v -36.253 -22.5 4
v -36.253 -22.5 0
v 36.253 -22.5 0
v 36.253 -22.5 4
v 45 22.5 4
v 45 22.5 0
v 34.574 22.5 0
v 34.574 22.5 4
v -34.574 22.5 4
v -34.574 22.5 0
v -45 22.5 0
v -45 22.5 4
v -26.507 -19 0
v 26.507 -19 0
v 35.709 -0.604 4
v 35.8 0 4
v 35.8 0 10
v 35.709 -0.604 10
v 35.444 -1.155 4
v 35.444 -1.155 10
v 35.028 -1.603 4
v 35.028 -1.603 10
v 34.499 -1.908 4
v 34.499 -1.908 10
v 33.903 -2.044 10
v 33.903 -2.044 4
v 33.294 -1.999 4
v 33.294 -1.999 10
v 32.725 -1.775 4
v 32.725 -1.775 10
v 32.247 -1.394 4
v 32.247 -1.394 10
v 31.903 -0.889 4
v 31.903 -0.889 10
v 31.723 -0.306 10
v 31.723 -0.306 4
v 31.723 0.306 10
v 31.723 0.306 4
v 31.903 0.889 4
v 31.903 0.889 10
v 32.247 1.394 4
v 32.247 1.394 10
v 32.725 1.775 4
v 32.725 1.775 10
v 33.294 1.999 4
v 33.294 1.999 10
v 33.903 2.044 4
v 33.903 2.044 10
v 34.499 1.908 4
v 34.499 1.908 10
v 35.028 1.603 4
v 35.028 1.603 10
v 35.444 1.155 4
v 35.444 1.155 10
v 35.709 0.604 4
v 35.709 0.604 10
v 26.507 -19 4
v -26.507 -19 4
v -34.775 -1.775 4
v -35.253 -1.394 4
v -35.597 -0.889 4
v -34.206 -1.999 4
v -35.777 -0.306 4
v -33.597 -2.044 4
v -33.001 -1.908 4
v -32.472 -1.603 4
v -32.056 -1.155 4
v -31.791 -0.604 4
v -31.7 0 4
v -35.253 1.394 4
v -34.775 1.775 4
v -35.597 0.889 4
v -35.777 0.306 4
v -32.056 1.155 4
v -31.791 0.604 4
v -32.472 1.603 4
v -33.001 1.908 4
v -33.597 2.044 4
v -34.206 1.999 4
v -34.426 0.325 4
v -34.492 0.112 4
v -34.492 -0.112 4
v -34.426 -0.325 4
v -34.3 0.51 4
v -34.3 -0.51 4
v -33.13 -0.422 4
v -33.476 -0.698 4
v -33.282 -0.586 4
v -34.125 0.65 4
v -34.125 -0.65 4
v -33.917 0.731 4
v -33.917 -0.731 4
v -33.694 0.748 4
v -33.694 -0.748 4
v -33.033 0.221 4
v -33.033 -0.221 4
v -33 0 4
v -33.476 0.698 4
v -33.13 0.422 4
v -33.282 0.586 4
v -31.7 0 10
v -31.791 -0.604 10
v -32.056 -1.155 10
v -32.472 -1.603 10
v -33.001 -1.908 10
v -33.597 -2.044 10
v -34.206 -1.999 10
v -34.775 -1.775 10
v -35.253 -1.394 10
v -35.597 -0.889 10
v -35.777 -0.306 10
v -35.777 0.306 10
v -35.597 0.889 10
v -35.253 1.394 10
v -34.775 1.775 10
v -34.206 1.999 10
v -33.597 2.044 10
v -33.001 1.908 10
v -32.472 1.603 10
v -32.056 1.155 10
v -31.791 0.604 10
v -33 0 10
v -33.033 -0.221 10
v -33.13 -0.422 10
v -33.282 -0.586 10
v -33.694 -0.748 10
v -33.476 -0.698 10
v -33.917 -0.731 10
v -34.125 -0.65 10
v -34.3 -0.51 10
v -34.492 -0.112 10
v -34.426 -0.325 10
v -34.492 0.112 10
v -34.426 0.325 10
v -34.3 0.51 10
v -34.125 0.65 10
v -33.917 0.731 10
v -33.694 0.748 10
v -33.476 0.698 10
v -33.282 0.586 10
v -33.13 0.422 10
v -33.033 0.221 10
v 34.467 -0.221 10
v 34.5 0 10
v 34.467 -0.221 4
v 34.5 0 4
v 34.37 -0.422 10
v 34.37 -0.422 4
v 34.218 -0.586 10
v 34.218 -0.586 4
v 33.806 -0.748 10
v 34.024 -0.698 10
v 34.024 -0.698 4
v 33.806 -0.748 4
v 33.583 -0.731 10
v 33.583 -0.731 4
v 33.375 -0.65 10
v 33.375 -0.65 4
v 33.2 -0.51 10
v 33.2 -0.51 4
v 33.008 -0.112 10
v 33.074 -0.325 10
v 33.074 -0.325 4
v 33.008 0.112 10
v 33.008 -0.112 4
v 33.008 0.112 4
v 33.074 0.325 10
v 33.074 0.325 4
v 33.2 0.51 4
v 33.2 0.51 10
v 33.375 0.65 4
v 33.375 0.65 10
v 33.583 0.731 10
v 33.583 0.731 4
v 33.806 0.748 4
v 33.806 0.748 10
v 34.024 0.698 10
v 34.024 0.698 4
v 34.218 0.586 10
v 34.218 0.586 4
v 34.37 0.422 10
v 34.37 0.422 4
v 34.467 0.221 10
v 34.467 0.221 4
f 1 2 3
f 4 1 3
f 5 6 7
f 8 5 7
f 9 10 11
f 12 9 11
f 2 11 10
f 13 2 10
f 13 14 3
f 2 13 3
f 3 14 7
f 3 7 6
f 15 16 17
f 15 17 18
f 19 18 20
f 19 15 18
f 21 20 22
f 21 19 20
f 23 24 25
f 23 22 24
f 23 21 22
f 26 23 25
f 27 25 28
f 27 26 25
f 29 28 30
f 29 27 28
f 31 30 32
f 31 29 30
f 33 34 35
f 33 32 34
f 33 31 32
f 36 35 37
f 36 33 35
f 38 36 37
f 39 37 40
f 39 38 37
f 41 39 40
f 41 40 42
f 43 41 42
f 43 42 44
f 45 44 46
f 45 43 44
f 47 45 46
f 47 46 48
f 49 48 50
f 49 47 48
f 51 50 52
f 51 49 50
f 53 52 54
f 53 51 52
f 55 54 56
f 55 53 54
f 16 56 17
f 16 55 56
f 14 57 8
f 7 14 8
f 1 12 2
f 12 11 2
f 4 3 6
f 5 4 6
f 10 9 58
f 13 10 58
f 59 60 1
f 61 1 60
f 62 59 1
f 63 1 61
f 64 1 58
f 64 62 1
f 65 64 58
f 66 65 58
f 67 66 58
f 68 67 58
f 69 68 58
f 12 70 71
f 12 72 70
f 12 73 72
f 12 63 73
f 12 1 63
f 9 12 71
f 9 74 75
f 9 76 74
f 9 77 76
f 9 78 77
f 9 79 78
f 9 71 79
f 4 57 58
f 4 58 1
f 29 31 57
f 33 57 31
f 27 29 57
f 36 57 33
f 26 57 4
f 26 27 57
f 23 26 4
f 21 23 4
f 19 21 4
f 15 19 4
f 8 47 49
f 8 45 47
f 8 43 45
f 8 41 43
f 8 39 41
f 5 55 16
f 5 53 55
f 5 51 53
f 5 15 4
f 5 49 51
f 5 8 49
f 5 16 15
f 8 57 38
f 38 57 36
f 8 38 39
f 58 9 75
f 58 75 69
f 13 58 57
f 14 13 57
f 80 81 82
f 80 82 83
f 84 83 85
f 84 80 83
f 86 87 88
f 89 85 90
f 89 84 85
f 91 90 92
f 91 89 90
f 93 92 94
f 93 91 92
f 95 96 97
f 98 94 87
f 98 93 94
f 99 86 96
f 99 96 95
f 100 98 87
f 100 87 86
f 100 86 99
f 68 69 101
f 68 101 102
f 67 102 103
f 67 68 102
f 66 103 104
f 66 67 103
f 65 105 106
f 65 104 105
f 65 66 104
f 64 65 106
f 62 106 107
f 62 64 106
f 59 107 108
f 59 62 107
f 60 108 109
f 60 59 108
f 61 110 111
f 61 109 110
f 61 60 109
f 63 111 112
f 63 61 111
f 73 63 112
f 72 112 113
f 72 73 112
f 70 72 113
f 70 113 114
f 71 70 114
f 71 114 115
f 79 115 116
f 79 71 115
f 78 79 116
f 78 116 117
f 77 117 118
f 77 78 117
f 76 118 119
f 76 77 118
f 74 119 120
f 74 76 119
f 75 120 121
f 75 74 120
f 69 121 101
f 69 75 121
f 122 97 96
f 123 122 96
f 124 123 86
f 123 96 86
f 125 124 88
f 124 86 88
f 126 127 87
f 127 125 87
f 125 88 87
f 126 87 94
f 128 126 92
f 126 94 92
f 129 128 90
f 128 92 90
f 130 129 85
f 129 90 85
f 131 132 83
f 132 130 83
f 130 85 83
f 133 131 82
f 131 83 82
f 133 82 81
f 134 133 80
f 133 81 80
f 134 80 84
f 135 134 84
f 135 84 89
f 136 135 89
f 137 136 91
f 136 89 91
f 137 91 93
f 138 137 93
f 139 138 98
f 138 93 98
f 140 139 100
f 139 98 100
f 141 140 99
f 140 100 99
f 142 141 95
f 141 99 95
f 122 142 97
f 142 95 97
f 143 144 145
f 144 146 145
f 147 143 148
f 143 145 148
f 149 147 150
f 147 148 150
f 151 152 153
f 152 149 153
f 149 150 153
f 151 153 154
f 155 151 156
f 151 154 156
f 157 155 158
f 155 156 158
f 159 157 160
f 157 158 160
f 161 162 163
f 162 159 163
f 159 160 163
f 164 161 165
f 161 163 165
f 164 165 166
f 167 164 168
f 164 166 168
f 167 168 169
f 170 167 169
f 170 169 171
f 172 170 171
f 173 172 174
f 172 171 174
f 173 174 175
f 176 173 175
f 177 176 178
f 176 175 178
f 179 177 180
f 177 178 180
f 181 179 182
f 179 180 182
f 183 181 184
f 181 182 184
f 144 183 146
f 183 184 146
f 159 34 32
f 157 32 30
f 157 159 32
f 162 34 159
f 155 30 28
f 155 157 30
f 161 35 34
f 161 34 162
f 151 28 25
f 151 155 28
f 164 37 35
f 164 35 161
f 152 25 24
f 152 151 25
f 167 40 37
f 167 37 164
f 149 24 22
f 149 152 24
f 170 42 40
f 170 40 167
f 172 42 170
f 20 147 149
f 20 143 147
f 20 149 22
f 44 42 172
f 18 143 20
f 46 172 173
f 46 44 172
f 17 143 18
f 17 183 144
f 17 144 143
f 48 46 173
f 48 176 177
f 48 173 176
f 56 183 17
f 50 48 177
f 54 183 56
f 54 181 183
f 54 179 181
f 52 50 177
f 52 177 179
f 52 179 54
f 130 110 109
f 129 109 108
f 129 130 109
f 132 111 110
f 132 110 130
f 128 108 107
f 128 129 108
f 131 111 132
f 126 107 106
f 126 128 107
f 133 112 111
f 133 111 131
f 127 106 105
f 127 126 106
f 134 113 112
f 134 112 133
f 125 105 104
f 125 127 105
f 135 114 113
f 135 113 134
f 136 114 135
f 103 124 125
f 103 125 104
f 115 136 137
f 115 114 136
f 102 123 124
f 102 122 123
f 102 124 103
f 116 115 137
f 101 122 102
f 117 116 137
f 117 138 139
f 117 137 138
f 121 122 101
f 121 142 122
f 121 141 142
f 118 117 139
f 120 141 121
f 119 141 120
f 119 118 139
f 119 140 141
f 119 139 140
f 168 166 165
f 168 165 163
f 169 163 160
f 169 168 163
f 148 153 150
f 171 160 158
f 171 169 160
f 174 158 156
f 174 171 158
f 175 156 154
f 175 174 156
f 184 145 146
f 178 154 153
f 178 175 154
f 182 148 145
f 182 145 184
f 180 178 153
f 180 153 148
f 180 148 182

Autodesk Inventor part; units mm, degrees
ref_plane "YZ Plane" through (0, 0, 0) normal (1, 0, 0) x (0, 1, 0)
ref_plane "XZ Plane" through (0, 0, 0) normal (0, 1, 0) x (-1, 0, 0)
ref_plane "XY Plane" through (0, 0, 0) normal (0, 0, 1) x (1, 0, 0)
sketch "Sketch1" plane through (0, 0, 0) normal (0, 0, 1) x (1, 0, 0)
  line L0 (-36.2529, -22.5) -> (36.2529, -22.5)
  line L1 (36.2529, -22.5) -> (45, 22.5)
  line L2 (45, 22.5) -> (-45, 22.5)
  line L3 (-45, 22.5) -> (-36.2529, -22.5)
  point P0 (0, 0)
  point P1 (0, -22.5)
  point P2 (40.6264, 0)
  point P3 (0, 22.5)
  dimension "d0" = 45
  dimension "d1" = 22
  dimension "d2" = 90
extrude "Extrusion1" add sketch "Sketch1" along normal blind 4
sketch "Sketch2" plane through (0, 0, 4) normal (0, 0, 1) x (1, 0, 0)
  line L0 (-33.75, 0) -> (33.75, 0) construction
  circle A0 centre (33.75, 0) radius 2.05
  circle A1 centre (-33.75, 0) radius 2.05
  line L1 (45, 22.5) -> (-45, 22.5) projected
  line L2 (-36.2529, -22.5) -> (36.2529, -22.5) projected
  circle A2 centre (33.75, 0) radius 0.75
  circle A3 centre (-33.75, 0) radius 0.75
  point P0 (0, 0)
  point P1 (0, 0)
  dimension "d5" = 67.5
  dimension "d6" = 4.1
  dimension "d7" = 22.5
  dimension "d8" = 45
  dimension "d9" = 1.5
extrude "Extrusion2" add sketch "Sketch2" along normal blind 6
sketch "Sketch3" plane through (0, 0, 4) normal (0, 0, 1) x (1, 0, 0)
  line L0 (-26.5068, -19) -> (26.5068, -19)
  line L1 (26.5068, -19) -> (34.5736, 22.5)
  line L2 (34.5736, 22.5) -> (-34.5736, 22.5)
  line L3 (-34.5736, 22.5) -> (-26.5068, -19)
  line L4 (-45, 22.5) -> (-36.2529, -22.5) projected
  line L5 (36.2529, -22.5) -> (45, 22.5) projected
  line L6 (-30.2, 0) -> (30.2, 0) construction
  circle A0 centre (33.75, 0) radius 2.05 projected
  line L7 (45, 22.5) -> (-45, 22.5) projected
  circle A1 centre (33.75, 0) radius 0.75 projected
  point P0 (0, 0)
  point P1 (0, -19)
  dimension "d13" = 60.4
  dimension "d14" = 19
extrude "Extrusion3" cut sketch "Sketch3" against normal through all contours L3 L2 L1 L0
sketch "Sketch4" plane through (0, 0, 4) normal (0, 0, 1) x (1, 0, 0)
  line L0 (37.1379, 16.0576) -> (37.8822, 19.7792) construction
  line L1 (35.8639, 16.3124) -> (36.6083, 20.034)
  line L2 (39.1561, 19.5244) -> (38.4118, 15.8028)
  arc A0 (35.8639, 16.3124) -> (38.4118, 15.8028) centre (37.1379, 16.0576) ccw
  arc A1 (39.1561, 19.5244) -> (36.6083, 20.034) centre (37.8822, 19.7792) ccw
  point P0 (0, 0)
  point P1 (37.51, 17.9184)
equation "\"d7\" = 0.5 * d8"
properties part number "Touchpad Top"
